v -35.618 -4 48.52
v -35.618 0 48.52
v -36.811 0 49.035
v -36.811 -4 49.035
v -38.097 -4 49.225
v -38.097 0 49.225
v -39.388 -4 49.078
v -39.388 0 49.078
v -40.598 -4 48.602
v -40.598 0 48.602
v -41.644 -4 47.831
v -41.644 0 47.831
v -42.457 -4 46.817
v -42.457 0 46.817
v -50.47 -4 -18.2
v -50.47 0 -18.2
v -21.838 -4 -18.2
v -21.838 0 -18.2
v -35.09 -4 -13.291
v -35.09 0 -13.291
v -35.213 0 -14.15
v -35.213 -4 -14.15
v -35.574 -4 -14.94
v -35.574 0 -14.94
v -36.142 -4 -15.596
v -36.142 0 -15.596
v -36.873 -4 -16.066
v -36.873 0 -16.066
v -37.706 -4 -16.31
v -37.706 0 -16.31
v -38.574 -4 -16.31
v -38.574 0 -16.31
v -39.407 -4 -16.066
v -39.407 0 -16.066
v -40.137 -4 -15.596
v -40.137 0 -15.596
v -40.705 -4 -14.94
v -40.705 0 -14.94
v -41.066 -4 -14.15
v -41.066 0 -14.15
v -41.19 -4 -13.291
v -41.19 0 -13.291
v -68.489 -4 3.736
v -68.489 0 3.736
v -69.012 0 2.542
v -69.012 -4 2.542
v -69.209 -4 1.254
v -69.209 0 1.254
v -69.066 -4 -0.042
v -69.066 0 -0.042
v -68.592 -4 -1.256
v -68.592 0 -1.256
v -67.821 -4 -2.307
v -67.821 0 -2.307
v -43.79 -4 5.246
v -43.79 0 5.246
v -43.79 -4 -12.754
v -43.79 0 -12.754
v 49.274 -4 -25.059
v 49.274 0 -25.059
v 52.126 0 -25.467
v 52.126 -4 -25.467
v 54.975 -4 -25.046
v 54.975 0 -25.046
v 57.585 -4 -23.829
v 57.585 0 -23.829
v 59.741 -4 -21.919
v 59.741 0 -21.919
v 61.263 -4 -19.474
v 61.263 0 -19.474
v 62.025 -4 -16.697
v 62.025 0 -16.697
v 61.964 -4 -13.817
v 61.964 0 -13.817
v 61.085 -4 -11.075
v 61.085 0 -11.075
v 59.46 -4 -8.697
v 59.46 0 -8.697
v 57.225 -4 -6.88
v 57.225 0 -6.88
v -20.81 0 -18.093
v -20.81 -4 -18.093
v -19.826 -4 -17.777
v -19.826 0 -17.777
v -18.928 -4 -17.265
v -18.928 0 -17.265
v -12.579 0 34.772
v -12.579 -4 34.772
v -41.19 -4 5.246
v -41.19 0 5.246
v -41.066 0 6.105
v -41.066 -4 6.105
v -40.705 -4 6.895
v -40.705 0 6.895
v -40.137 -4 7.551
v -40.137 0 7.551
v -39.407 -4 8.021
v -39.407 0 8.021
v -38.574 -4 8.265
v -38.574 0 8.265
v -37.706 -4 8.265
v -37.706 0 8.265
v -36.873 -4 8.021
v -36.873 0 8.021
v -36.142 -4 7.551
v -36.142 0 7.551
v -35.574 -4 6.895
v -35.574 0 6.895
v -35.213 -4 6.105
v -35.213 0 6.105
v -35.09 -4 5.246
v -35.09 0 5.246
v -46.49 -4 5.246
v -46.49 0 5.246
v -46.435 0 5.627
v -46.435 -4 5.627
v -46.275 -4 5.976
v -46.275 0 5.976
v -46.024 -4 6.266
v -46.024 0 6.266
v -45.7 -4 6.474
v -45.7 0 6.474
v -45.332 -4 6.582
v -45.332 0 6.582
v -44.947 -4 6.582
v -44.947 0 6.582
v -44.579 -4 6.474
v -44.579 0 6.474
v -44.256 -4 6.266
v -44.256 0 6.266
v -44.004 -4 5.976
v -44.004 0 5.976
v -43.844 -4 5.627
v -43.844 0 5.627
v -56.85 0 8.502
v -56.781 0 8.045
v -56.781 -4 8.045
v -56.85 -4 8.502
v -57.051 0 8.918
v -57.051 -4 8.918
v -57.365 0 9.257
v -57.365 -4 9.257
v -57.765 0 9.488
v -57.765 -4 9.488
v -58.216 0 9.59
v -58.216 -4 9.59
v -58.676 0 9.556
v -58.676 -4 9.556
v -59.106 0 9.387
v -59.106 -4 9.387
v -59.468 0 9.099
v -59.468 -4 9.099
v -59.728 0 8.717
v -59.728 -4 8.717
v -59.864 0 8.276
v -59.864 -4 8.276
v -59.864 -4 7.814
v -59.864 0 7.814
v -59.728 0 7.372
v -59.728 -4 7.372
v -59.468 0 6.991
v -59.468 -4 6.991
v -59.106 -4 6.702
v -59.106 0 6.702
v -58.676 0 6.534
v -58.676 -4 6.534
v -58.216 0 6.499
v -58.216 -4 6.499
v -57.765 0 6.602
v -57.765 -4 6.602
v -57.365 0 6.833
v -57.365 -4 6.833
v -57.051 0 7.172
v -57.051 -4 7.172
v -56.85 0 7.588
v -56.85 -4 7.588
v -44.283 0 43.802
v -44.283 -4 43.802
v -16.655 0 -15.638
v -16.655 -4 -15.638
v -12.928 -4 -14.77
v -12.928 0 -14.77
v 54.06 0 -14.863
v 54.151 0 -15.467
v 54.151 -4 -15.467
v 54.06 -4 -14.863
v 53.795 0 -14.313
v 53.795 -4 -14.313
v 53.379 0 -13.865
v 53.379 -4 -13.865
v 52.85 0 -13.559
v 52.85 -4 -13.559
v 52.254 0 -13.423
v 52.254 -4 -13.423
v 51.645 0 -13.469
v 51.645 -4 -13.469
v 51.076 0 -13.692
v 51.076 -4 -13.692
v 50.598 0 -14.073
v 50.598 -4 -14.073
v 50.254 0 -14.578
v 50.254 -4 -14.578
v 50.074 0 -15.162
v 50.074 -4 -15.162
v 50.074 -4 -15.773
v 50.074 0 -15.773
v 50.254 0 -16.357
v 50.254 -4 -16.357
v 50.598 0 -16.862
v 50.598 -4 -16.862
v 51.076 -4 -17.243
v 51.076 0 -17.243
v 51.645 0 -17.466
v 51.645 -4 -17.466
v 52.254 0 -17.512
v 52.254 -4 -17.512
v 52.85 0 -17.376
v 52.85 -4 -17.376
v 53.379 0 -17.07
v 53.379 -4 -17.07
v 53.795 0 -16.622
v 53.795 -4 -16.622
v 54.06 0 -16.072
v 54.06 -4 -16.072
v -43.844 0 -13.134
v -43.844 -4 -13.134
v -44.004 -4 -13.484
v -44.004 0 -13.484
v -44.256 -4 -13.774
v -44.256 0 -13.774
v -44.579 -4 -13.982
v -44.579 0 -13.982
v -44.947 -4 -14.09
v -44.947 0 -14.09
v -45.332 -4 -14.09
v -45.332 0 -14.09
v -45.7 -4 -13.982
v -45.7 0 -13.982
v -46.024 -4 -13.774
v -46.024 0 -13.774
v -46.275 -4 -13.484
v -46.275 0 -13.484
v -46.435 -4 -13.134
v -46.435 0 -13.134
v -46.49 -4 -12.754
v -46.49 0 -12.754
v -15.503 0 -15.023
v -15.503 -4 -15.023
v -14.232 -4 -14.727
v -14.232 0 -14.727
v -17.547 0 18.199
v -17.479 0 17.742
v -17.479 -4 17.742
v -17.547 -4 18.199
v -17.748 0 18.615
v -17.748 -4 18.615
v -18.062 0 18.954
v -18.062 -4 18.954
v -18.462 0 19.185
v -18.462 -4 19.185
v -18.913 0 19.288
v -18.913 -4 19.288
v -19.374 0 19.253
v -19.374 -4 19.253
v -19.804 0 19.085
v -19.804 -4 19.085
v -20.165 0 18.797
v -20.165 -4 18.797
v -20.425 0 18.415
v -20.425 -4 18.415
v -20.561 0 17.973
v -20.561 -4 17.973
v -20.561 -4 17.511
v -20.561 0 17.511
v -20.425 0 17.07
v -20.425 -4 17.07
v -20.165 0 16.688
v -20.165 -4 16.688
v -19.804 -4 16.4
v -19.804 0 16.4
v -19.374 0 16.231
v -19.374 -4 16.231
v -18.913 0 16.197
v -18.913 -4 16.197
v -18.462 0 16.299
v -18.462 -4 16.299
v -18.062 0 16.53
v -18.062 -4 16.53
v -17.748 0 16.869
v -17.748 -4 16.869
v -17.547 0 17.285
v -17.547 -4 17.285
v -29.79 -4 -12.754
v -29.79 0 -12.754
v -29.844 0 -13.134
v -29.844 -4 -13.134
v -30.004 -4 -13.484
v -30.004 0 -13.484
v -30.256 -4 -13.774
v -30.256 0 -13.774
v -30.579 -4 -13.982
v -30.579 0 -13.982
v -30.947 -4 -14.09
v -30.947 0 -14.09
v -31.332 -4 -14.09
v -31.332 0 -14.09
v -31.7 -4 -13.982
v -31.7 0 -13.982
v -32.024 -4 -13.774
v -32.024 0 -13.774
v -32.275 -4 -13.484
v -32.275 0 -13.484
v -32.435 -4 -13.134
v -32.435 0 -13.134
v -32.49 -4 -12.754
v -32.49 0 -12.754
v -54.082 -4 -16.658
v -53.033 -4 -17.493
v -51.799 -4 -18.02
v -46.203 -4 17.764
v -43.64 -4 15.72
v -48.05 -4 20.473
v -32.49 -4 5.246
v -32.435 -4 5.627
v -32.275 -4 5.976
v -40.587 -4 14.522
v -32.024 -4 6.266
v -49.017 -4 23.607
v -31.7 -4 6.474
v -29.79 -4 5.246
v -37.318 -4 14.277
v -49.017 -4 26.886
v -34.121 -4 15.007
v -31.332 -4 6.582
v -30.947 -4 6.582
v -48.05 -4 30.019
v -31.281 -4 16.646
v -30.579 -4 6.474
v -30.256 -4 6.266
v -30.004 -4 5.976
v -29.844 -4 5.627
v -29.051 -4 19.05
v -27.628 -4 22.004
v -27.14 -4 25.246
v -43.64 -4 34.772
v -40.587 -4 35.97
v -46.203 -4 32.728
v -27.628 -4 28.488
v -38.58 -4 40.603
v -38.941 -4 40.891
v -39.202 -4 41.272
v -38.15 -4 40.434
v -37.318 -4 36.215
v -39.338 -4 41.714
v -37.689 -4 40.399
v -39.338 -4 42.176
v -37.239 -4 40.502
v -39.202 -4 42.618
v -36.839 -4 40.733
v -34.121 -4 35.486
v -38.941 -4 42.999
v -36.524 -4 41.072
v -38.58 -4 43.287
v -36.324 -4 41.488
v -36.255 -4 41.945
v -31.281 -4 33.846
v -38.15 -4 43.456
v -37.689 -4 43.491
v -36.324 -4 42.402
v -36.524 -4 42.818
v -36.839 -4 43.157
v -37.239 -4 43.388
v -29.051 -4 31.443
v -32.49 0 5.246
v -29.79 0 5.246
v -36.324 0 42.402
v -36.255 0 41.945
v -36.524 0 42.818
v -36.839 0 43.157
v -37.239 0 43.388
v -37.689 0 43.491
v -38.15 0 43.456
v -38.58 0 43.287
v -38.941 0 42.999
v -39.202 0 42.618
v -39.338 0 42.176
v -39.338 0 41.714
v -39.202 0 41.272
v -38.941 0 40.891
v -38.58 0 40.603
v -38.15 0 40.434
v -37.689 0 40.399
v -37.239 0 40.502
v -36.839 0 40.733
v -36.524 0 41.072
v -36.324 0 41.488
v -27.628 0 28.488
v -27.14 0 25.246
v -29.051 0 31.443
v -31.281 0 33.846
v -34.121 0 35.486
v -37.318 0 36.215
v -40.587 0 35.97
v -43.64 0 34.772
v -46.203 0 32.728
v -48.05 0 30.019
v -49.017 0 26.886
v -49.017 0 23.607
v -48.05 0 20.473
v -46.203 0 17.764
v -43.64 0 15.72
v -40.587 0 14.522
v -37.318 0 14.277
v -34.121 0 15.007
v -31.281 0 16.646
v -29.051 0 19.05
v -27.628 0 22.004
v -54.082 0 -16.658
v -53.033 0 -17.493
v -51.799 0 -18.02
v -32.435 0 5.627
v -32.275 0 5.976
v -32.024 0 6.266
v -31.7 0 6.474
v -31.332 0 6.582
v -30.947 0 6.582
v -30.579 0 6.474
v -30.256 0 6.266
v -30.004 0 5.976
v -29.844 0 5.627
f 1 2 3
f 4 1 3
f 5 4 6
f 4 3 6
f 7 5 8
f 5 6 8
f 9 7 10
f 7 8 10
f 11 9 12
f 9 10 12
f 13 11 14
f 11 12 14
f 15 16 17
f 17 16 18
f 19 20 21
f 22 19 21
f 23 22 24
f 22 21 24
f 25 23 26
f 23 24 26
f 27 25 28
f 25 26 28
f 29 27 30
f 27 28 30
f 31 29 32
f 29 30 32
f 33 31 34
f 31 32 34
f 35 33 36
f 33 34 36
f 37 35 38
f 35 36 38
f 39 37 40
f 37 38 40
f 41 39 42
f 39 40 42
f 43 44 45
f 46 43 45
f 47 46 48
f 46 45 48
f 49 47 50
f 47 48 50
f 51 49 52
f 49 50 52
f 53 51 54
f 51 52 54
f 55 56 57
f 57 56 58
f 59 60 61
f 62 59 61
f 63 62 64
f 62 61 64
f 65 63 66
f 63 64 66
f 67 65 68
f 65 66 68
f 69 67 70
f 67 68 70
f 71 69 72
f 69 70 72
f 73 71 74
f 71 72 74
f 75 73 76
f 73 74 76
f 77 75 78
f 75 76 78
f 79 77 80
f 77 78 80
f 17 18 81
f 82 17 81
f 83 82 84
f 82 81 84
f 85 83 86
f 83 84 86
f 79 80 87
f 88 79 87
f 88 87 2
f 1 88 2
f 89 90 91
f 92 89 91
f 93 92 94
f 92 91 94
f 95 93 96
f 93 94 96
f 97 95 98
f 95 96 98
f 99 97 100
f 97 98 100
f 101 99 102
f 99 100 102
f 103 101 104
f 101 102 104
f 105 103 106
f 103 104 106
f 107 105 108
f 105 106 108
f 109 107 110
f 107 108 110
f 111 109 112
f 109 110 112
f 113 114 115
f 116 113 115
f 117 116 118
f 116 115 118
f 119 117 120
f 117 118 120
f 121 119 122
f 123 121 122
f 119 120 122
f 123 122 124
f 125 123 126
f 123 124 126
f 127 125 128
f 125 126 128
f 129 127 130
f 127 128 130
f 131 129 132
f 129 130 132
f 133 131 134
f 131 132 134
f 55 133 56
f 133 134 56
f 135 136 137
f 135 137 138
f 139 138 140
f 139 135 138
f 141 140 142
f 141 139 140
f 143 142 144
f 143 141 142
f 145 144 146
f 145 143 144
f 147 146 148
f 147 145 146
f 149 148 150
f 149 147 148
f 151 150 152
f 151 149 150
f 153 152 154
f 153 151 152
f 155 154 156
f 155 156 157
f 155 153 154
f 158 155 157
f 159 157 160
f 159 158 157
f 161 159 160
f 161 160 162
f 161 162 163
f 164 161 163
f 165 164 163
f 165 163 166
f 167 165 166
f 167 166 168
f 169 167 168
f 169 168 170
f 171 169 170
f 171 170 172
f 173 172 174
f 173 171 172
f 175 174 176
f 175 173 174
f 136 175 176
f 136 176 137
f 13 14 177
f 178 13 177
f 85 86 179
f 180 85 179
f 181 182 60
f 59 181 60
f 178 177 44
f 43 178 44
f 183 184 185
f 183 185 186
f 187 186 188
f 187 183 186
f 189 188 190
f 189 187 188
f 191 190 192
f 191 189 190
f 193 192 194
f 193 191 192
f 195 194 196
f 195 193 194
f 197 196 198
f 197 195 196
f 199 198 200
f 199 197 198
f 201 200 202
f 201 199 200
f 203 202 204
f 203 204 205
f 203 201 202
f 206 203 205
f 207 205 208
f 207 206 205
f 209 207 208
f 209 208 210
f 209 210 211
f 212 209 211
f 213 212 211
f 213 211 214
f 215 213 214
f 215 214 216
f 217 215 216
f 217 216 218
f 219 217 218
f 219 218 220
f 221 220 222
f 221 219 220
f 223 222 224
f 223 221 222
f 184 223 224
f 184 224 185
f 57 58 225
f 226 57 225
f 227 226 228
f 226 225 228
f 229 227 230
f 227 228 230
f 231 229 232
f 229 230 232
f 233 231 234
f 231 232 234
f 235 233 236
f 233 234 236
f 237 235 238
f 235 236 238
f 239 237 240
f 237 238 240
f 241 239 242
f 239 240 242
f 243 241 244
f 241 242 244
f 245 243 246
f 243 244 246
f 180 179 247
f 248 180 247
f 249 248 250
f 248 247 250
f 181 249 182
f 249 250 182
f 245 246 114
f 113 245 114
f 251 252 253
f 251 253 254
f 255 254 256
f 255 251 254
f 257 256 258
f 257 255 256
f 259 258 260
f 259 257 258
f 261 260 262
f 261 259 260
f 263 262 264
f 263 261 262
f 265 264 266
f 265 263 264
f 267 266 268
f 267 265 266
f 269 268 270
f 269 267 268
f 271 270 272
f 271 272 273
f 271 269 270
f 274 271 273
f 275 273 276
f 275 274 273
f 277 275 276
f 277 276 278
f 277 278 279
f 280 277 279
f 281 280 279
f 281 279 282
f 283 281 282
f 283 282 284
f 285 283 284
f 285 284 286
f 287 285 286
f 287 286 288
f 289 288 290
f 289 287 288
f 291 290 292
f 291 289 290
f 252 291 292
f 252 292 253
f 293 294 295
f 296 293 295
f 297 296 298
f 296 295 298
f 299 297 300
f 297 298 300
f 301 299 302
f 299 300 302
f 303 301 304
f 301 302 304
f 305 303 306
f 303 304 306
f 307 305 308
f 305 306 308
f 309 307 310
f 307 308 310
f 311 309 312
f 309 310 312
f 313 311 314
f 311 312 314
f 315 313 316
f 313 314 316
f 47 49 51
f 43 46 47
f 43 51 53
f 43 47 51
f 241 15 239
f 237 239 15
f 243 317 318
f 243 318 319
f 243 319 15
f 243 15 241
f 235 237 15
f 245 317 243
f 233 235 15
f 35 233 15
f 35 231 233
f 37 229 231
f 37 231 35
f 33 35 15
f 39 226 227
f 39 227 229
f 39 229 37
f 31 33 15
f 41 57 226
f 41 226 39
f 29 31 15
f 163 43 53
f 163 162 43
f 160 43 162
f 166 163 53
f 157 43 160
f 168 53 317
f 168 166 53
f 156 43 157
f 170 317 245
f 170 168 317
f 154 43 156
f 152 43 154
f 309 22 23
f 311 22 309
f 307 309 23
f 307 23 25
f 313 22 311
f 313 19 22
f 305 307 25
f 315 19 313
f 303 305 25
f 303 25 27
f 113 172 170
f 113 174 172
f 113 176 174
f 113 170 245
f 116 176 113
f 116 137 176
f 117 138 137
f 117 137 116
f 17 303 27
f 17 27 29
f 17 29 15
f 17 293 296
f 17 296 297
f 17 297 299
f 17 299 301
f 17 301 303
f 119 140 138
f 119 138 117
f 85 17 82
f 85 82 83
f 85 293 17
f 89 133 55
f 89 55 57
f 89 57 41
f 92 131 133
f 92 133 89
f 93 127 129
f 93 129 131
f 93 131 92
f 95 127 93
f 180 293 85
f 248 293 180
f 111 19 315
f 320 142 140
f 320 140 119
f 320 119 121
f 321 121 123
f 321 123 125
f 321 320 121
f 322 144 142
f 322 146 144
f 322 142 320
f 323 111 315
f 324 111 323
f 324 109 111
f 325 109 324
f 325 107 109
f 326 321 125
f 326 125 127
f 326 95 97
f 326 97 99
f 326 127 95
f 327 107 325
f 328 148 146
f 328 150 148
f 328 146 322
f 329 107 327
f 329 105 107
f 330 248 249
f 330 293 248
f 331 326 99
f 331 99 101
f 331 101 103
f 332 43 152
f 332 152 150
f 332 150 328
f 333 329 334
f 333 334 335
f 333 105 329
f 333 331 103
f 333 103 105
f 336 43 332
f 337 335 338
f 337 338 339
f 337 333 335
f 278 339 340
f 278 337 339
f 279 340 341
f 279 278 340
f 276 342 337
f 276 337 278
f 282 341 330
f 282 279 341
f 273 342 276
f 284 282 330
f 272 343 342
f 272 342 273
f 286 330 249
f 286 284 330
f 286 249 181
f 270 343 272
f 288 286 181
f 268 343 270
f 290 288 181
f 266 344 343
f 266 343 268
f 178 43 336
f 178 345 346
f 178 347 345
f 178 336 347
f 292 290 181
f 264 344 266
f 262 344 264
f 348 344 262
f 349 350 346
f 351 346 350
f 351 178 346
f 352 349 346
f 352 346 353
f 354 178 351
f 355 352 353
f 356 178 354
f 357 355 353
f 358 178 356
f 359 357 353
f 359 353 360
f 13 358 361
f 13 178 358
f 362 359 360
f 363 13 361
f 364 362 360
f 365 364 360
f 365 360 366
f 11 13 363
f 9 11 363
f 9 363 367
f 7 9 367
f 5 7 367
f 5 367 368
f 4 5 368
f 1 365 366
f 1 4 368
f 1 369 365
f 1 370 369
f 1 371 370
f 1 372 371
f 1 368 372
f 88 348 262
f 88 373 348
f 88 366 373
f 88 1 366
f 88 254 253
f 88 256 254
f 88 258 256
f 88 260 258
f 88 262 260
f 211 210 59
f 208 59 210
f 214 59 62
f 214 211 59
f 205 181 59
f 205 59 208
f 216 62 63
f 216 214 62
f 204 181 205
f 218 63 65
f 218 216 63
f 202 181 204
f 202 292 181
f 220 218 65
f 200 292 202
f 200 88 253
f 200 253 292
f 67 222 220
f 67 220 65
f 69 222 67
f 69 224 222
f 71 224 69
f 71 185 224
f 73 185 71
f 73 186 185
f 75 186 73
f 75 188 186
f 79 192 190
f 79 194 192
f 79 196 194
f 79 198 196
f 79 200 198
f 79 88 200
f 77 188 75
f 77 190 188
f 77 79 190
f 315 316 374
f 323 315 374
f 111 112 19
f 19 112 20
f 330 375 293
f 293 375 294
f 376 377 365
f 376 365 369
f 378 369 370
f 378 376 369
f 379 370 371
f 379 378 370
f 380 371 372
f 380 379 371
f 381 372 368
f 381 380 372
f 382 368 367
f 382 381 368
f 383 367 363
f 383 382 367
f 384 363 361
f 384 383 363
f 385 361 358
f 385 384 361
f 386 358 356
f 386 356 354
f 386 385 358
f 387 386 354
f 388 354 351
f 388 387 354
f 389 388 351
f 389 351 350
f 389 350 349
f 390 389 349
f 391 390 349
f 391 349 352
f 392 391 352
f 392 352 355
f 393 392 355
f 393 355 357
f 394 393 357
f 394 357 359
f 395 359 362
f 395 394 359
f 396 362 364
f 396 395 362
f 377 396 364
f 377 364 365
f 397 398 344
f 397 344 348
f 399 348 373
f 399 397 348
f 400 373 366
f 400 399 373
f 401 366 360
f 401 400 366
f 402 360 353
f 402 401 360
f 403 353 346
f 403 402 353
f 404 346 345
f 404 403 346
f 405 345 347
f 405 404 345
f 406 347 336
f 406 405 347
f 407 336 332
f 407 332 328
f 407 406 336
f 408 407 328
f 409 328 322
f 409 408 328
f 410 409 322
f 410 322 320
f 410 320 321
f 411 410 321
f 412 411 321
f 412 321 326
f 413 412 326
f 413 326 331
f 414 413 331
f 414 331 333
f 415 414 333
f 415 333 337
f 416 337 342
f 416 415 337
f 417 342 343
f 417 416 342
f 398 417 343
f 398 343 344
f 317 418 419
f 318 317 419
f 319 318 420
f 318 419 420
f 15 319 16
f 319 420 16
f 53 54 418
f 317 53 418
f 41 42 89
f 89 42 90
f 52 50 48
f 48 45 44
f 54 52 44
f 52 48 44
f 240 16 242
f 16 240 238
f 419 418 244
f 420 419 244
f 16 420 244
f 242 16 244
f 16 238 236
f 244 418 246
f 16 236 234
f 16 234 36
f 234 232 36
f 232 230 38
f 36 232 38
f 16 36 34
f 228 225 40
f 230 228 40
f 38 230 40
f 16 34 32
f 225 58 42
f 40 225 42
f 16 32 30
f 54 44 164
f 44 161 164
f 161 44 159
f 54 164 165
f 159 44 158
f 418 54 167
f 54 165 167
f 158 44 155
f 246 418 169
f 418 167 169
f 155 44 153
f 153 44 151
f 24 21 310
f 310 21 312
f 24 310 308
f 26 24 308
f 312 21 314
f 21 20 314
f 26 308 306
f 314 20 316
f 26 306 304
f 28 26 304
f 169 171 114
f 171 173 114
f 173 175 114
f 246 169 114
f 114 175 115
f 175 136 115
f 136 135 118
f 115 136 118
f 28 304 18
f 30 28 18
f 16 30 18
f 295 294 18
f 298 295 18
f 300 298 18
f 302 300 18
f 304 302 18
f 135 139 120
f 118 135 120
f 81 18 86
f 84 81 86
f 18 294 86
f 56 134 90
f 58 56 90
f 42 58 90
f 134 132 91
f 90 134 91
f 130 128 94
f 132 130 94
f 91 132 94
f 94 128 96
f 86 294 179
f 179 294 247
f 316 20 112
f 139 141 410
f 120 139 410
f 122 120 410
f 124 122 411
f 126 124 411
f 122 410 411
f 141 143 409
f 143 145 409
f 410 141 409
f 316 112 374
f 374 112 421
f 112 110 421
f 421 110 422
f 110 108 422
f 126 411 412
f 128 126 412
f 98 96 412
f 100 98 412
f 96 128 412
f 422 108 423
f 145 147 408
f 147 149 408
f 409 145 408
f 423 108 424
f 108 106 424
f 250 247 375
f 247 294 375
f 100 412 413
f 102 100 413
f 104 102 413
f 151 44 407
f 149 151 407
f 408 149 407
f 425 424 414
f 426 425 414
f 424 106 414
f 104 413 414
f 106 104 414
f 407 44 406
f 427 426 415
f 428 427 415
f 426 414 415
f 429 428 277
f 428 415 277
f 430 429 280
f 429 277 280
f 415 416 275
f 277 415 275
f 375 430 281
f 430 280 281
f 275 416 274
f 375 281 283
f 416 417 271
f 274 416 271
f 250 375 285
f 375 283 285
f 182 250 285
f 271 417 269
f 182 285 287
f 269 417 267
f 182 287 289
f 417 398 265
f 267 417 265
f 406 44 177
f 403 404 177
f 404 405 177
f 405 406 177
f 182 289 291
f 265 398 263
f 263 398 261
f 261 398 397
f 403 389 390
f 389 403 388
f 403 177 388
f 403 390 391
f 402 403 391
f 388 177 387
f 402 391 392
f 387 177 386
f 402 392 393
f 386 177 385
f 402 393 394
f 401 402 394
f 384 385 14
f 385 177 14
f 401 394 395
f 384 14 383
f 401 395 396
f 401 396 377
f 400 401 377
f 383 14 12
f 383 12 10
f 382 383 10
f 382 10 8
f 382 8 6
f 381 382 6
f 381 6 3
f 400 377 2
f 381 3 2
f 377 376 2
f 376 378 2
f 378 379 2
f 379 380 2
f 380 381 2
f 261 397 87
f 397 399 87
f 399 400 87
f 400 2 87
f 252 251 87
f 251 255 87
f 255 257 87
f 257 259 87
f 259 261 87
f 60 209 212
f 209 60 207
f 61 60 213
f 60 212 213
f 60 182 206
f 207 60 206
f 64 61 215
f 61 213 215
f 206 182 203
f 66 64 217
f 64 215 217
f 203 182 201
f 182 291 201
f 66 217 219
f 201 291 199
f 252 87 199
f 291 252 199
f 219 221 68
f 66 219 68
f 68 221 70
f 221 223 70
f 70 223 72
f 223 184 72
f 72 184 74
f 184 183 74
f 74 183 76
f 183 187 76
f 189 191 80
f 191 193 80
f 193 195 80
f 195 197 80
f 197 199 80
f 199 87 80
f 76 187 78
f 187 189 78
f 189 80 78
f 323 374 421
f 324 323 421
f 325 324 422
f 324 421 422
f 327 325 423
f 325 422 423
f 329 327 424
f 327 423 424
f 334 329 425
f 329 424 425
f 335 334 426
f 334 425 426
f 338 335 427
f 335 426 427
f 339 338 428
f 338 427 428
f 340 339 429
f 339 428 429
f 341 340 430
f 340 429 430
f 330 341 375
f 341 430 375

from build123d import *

# Parameters (mm, degrees)
F0_R     = 1.55
F0_R_2   = 2.05
F0_R_3   = 11
F1_DEPTH = 4


with BuildPart() as f1:
    # F0 (on Front) → F1 (new body)
    with BuildSketch(Plane.XZ):
        with BuildLine():
            Line((-12.9276869952, -14.7702103927), (49.2744245402, -25.0594563055))
            ThreePointArc((49.2744245402, -25.0594563055), (61.2632923167, -19.4743843221), (57.2253318853, -6.8799071524))
            Line((57.2253318853, -6.8799071524), (-12.5790872929, 34.7723583687))
            Line((-12.5790872929, 34.7723583687), (-35.6180453168, 48.5196942571))
            ThreePointArc((-35.6180453168, 48.5196942571), (-39.3883061053, 49.0778177624), (-42.4565310048, 46.8167639757))
            Line((-42.4565310048, 46.8167639757), (-44.283169795, 43.8016410413))
            Line((-44.283169795, 43.8016410413), (-68.4894634868, 3.7363676474))
            ThreePointArc((-68.4894634868, 3.7363676474), (-69.1796280017, 0.6014549382), (-67.8214663387, -2.3070501159))
            Line((-67.8214663387, -2.3070501159), (-54.0816127895, -16.6578253643))
            ThreePointArc((-54.0816127895, -16.6578253643), (-52.4335683043, -17.7983223484), (-50.4700412586, -18.200000748))
            Line((-50.4700412586, -18.200000748), (-21.8383905306, -18.200000748))
            ThreePointArc((-21.8383905306, -18.200000748), (-20.3097897038, -17.960607801), (-18.9275633798, -17.265352553))
            Line((-18.9275633798, -17.265352553), (-16.6545073746, -15.6378247392))
            ThreePointArc((-16.6545073746, -15.6378247392), (-14.877378135, -14.8333994398), (-12.9276869952, -14.7702103927))
        make_face()
        with BuildLine():
            ThreePointArc((-46.4896173713, 5.2461908635), (-45.1396173713, 6.5961908635), (-43.7896173713, 5.2461908635))
            Line((-43.7896173713, 5.2461908635), (-43.7896173713, -12.7538091365))
            ThreePointArc((-43.7896173713, -12.7538091365), (-45.1396173713, -14.1038091365), (-46.4896173713, -12.7538091365))
            Line((-46.4896173713, -12.7538091365), (-46.4896173713, 5.2461908635))
        make_face(mode=Mode.SUBTRACT)
        with BuildLine():
            Line((-41.1896173713, -13.2911801338), (-41.1896173713, 5.2461908635))
            ThreePointArc((-41.1896173713, 5.2461908635), (-38.1396173713, 8.2961908635), (-35.0896173713, 5.2461908635))
            Line((-35.0896173713, 5.2461908635), (-35.0896173713, -13.2911801338))
            ThreePointArc((-35.0896173713, -13.2911801338), (-38.1396173713, -16.3411801338), (-41.1896173713, -13.2911801338))
        make_face(mode=Mode.SUBTRACT)
        with Locations((-58.3313559954, 8.044780269)):
            Circle(F0_R, mode=Mode.SUBTRACT)
        with BuildLine():
            Line((-32.4896173713, -12.7538091365), (-32.4896173713, 5.2461908635))
            ThreePointArc((-32.4896173713, 5.2461908635), (-31.1396173713, 6.5961908635), (-29.7896173713, 5.2461908635))
            Line((-29.7896173713, 5.2461908635), (-29.7896173713, -12.7538091365))
            ThreePointArc((-29.7896173713, -12.7538091365), (-31.1396173713, -14.1038091365), (-32.4896173713, -12.7538091365))
        make_face(mode=Mode.SUBTRACT)
        with Locations((52.1012294587, -15.4673150455)):
            Circle(F0_R_2, mode=Mode.SUBTRACT)
        with Locations((-38.1396173713, 25.2461908635)):
            Circle(F0_R_3, mode=Mode.SUBTRACT)
        with Locations((-19.0286114888, 17.7422984931)):
            Circle(F0_R, mode=Mode.SUBTRACT)
        with Locations((-37.8051390947, 41.9450122359)):
            Circle(F0_R, mode=Mode.SUBTRACT)
    extrude(amount=F1_DEPTH)


solid = f1.part
